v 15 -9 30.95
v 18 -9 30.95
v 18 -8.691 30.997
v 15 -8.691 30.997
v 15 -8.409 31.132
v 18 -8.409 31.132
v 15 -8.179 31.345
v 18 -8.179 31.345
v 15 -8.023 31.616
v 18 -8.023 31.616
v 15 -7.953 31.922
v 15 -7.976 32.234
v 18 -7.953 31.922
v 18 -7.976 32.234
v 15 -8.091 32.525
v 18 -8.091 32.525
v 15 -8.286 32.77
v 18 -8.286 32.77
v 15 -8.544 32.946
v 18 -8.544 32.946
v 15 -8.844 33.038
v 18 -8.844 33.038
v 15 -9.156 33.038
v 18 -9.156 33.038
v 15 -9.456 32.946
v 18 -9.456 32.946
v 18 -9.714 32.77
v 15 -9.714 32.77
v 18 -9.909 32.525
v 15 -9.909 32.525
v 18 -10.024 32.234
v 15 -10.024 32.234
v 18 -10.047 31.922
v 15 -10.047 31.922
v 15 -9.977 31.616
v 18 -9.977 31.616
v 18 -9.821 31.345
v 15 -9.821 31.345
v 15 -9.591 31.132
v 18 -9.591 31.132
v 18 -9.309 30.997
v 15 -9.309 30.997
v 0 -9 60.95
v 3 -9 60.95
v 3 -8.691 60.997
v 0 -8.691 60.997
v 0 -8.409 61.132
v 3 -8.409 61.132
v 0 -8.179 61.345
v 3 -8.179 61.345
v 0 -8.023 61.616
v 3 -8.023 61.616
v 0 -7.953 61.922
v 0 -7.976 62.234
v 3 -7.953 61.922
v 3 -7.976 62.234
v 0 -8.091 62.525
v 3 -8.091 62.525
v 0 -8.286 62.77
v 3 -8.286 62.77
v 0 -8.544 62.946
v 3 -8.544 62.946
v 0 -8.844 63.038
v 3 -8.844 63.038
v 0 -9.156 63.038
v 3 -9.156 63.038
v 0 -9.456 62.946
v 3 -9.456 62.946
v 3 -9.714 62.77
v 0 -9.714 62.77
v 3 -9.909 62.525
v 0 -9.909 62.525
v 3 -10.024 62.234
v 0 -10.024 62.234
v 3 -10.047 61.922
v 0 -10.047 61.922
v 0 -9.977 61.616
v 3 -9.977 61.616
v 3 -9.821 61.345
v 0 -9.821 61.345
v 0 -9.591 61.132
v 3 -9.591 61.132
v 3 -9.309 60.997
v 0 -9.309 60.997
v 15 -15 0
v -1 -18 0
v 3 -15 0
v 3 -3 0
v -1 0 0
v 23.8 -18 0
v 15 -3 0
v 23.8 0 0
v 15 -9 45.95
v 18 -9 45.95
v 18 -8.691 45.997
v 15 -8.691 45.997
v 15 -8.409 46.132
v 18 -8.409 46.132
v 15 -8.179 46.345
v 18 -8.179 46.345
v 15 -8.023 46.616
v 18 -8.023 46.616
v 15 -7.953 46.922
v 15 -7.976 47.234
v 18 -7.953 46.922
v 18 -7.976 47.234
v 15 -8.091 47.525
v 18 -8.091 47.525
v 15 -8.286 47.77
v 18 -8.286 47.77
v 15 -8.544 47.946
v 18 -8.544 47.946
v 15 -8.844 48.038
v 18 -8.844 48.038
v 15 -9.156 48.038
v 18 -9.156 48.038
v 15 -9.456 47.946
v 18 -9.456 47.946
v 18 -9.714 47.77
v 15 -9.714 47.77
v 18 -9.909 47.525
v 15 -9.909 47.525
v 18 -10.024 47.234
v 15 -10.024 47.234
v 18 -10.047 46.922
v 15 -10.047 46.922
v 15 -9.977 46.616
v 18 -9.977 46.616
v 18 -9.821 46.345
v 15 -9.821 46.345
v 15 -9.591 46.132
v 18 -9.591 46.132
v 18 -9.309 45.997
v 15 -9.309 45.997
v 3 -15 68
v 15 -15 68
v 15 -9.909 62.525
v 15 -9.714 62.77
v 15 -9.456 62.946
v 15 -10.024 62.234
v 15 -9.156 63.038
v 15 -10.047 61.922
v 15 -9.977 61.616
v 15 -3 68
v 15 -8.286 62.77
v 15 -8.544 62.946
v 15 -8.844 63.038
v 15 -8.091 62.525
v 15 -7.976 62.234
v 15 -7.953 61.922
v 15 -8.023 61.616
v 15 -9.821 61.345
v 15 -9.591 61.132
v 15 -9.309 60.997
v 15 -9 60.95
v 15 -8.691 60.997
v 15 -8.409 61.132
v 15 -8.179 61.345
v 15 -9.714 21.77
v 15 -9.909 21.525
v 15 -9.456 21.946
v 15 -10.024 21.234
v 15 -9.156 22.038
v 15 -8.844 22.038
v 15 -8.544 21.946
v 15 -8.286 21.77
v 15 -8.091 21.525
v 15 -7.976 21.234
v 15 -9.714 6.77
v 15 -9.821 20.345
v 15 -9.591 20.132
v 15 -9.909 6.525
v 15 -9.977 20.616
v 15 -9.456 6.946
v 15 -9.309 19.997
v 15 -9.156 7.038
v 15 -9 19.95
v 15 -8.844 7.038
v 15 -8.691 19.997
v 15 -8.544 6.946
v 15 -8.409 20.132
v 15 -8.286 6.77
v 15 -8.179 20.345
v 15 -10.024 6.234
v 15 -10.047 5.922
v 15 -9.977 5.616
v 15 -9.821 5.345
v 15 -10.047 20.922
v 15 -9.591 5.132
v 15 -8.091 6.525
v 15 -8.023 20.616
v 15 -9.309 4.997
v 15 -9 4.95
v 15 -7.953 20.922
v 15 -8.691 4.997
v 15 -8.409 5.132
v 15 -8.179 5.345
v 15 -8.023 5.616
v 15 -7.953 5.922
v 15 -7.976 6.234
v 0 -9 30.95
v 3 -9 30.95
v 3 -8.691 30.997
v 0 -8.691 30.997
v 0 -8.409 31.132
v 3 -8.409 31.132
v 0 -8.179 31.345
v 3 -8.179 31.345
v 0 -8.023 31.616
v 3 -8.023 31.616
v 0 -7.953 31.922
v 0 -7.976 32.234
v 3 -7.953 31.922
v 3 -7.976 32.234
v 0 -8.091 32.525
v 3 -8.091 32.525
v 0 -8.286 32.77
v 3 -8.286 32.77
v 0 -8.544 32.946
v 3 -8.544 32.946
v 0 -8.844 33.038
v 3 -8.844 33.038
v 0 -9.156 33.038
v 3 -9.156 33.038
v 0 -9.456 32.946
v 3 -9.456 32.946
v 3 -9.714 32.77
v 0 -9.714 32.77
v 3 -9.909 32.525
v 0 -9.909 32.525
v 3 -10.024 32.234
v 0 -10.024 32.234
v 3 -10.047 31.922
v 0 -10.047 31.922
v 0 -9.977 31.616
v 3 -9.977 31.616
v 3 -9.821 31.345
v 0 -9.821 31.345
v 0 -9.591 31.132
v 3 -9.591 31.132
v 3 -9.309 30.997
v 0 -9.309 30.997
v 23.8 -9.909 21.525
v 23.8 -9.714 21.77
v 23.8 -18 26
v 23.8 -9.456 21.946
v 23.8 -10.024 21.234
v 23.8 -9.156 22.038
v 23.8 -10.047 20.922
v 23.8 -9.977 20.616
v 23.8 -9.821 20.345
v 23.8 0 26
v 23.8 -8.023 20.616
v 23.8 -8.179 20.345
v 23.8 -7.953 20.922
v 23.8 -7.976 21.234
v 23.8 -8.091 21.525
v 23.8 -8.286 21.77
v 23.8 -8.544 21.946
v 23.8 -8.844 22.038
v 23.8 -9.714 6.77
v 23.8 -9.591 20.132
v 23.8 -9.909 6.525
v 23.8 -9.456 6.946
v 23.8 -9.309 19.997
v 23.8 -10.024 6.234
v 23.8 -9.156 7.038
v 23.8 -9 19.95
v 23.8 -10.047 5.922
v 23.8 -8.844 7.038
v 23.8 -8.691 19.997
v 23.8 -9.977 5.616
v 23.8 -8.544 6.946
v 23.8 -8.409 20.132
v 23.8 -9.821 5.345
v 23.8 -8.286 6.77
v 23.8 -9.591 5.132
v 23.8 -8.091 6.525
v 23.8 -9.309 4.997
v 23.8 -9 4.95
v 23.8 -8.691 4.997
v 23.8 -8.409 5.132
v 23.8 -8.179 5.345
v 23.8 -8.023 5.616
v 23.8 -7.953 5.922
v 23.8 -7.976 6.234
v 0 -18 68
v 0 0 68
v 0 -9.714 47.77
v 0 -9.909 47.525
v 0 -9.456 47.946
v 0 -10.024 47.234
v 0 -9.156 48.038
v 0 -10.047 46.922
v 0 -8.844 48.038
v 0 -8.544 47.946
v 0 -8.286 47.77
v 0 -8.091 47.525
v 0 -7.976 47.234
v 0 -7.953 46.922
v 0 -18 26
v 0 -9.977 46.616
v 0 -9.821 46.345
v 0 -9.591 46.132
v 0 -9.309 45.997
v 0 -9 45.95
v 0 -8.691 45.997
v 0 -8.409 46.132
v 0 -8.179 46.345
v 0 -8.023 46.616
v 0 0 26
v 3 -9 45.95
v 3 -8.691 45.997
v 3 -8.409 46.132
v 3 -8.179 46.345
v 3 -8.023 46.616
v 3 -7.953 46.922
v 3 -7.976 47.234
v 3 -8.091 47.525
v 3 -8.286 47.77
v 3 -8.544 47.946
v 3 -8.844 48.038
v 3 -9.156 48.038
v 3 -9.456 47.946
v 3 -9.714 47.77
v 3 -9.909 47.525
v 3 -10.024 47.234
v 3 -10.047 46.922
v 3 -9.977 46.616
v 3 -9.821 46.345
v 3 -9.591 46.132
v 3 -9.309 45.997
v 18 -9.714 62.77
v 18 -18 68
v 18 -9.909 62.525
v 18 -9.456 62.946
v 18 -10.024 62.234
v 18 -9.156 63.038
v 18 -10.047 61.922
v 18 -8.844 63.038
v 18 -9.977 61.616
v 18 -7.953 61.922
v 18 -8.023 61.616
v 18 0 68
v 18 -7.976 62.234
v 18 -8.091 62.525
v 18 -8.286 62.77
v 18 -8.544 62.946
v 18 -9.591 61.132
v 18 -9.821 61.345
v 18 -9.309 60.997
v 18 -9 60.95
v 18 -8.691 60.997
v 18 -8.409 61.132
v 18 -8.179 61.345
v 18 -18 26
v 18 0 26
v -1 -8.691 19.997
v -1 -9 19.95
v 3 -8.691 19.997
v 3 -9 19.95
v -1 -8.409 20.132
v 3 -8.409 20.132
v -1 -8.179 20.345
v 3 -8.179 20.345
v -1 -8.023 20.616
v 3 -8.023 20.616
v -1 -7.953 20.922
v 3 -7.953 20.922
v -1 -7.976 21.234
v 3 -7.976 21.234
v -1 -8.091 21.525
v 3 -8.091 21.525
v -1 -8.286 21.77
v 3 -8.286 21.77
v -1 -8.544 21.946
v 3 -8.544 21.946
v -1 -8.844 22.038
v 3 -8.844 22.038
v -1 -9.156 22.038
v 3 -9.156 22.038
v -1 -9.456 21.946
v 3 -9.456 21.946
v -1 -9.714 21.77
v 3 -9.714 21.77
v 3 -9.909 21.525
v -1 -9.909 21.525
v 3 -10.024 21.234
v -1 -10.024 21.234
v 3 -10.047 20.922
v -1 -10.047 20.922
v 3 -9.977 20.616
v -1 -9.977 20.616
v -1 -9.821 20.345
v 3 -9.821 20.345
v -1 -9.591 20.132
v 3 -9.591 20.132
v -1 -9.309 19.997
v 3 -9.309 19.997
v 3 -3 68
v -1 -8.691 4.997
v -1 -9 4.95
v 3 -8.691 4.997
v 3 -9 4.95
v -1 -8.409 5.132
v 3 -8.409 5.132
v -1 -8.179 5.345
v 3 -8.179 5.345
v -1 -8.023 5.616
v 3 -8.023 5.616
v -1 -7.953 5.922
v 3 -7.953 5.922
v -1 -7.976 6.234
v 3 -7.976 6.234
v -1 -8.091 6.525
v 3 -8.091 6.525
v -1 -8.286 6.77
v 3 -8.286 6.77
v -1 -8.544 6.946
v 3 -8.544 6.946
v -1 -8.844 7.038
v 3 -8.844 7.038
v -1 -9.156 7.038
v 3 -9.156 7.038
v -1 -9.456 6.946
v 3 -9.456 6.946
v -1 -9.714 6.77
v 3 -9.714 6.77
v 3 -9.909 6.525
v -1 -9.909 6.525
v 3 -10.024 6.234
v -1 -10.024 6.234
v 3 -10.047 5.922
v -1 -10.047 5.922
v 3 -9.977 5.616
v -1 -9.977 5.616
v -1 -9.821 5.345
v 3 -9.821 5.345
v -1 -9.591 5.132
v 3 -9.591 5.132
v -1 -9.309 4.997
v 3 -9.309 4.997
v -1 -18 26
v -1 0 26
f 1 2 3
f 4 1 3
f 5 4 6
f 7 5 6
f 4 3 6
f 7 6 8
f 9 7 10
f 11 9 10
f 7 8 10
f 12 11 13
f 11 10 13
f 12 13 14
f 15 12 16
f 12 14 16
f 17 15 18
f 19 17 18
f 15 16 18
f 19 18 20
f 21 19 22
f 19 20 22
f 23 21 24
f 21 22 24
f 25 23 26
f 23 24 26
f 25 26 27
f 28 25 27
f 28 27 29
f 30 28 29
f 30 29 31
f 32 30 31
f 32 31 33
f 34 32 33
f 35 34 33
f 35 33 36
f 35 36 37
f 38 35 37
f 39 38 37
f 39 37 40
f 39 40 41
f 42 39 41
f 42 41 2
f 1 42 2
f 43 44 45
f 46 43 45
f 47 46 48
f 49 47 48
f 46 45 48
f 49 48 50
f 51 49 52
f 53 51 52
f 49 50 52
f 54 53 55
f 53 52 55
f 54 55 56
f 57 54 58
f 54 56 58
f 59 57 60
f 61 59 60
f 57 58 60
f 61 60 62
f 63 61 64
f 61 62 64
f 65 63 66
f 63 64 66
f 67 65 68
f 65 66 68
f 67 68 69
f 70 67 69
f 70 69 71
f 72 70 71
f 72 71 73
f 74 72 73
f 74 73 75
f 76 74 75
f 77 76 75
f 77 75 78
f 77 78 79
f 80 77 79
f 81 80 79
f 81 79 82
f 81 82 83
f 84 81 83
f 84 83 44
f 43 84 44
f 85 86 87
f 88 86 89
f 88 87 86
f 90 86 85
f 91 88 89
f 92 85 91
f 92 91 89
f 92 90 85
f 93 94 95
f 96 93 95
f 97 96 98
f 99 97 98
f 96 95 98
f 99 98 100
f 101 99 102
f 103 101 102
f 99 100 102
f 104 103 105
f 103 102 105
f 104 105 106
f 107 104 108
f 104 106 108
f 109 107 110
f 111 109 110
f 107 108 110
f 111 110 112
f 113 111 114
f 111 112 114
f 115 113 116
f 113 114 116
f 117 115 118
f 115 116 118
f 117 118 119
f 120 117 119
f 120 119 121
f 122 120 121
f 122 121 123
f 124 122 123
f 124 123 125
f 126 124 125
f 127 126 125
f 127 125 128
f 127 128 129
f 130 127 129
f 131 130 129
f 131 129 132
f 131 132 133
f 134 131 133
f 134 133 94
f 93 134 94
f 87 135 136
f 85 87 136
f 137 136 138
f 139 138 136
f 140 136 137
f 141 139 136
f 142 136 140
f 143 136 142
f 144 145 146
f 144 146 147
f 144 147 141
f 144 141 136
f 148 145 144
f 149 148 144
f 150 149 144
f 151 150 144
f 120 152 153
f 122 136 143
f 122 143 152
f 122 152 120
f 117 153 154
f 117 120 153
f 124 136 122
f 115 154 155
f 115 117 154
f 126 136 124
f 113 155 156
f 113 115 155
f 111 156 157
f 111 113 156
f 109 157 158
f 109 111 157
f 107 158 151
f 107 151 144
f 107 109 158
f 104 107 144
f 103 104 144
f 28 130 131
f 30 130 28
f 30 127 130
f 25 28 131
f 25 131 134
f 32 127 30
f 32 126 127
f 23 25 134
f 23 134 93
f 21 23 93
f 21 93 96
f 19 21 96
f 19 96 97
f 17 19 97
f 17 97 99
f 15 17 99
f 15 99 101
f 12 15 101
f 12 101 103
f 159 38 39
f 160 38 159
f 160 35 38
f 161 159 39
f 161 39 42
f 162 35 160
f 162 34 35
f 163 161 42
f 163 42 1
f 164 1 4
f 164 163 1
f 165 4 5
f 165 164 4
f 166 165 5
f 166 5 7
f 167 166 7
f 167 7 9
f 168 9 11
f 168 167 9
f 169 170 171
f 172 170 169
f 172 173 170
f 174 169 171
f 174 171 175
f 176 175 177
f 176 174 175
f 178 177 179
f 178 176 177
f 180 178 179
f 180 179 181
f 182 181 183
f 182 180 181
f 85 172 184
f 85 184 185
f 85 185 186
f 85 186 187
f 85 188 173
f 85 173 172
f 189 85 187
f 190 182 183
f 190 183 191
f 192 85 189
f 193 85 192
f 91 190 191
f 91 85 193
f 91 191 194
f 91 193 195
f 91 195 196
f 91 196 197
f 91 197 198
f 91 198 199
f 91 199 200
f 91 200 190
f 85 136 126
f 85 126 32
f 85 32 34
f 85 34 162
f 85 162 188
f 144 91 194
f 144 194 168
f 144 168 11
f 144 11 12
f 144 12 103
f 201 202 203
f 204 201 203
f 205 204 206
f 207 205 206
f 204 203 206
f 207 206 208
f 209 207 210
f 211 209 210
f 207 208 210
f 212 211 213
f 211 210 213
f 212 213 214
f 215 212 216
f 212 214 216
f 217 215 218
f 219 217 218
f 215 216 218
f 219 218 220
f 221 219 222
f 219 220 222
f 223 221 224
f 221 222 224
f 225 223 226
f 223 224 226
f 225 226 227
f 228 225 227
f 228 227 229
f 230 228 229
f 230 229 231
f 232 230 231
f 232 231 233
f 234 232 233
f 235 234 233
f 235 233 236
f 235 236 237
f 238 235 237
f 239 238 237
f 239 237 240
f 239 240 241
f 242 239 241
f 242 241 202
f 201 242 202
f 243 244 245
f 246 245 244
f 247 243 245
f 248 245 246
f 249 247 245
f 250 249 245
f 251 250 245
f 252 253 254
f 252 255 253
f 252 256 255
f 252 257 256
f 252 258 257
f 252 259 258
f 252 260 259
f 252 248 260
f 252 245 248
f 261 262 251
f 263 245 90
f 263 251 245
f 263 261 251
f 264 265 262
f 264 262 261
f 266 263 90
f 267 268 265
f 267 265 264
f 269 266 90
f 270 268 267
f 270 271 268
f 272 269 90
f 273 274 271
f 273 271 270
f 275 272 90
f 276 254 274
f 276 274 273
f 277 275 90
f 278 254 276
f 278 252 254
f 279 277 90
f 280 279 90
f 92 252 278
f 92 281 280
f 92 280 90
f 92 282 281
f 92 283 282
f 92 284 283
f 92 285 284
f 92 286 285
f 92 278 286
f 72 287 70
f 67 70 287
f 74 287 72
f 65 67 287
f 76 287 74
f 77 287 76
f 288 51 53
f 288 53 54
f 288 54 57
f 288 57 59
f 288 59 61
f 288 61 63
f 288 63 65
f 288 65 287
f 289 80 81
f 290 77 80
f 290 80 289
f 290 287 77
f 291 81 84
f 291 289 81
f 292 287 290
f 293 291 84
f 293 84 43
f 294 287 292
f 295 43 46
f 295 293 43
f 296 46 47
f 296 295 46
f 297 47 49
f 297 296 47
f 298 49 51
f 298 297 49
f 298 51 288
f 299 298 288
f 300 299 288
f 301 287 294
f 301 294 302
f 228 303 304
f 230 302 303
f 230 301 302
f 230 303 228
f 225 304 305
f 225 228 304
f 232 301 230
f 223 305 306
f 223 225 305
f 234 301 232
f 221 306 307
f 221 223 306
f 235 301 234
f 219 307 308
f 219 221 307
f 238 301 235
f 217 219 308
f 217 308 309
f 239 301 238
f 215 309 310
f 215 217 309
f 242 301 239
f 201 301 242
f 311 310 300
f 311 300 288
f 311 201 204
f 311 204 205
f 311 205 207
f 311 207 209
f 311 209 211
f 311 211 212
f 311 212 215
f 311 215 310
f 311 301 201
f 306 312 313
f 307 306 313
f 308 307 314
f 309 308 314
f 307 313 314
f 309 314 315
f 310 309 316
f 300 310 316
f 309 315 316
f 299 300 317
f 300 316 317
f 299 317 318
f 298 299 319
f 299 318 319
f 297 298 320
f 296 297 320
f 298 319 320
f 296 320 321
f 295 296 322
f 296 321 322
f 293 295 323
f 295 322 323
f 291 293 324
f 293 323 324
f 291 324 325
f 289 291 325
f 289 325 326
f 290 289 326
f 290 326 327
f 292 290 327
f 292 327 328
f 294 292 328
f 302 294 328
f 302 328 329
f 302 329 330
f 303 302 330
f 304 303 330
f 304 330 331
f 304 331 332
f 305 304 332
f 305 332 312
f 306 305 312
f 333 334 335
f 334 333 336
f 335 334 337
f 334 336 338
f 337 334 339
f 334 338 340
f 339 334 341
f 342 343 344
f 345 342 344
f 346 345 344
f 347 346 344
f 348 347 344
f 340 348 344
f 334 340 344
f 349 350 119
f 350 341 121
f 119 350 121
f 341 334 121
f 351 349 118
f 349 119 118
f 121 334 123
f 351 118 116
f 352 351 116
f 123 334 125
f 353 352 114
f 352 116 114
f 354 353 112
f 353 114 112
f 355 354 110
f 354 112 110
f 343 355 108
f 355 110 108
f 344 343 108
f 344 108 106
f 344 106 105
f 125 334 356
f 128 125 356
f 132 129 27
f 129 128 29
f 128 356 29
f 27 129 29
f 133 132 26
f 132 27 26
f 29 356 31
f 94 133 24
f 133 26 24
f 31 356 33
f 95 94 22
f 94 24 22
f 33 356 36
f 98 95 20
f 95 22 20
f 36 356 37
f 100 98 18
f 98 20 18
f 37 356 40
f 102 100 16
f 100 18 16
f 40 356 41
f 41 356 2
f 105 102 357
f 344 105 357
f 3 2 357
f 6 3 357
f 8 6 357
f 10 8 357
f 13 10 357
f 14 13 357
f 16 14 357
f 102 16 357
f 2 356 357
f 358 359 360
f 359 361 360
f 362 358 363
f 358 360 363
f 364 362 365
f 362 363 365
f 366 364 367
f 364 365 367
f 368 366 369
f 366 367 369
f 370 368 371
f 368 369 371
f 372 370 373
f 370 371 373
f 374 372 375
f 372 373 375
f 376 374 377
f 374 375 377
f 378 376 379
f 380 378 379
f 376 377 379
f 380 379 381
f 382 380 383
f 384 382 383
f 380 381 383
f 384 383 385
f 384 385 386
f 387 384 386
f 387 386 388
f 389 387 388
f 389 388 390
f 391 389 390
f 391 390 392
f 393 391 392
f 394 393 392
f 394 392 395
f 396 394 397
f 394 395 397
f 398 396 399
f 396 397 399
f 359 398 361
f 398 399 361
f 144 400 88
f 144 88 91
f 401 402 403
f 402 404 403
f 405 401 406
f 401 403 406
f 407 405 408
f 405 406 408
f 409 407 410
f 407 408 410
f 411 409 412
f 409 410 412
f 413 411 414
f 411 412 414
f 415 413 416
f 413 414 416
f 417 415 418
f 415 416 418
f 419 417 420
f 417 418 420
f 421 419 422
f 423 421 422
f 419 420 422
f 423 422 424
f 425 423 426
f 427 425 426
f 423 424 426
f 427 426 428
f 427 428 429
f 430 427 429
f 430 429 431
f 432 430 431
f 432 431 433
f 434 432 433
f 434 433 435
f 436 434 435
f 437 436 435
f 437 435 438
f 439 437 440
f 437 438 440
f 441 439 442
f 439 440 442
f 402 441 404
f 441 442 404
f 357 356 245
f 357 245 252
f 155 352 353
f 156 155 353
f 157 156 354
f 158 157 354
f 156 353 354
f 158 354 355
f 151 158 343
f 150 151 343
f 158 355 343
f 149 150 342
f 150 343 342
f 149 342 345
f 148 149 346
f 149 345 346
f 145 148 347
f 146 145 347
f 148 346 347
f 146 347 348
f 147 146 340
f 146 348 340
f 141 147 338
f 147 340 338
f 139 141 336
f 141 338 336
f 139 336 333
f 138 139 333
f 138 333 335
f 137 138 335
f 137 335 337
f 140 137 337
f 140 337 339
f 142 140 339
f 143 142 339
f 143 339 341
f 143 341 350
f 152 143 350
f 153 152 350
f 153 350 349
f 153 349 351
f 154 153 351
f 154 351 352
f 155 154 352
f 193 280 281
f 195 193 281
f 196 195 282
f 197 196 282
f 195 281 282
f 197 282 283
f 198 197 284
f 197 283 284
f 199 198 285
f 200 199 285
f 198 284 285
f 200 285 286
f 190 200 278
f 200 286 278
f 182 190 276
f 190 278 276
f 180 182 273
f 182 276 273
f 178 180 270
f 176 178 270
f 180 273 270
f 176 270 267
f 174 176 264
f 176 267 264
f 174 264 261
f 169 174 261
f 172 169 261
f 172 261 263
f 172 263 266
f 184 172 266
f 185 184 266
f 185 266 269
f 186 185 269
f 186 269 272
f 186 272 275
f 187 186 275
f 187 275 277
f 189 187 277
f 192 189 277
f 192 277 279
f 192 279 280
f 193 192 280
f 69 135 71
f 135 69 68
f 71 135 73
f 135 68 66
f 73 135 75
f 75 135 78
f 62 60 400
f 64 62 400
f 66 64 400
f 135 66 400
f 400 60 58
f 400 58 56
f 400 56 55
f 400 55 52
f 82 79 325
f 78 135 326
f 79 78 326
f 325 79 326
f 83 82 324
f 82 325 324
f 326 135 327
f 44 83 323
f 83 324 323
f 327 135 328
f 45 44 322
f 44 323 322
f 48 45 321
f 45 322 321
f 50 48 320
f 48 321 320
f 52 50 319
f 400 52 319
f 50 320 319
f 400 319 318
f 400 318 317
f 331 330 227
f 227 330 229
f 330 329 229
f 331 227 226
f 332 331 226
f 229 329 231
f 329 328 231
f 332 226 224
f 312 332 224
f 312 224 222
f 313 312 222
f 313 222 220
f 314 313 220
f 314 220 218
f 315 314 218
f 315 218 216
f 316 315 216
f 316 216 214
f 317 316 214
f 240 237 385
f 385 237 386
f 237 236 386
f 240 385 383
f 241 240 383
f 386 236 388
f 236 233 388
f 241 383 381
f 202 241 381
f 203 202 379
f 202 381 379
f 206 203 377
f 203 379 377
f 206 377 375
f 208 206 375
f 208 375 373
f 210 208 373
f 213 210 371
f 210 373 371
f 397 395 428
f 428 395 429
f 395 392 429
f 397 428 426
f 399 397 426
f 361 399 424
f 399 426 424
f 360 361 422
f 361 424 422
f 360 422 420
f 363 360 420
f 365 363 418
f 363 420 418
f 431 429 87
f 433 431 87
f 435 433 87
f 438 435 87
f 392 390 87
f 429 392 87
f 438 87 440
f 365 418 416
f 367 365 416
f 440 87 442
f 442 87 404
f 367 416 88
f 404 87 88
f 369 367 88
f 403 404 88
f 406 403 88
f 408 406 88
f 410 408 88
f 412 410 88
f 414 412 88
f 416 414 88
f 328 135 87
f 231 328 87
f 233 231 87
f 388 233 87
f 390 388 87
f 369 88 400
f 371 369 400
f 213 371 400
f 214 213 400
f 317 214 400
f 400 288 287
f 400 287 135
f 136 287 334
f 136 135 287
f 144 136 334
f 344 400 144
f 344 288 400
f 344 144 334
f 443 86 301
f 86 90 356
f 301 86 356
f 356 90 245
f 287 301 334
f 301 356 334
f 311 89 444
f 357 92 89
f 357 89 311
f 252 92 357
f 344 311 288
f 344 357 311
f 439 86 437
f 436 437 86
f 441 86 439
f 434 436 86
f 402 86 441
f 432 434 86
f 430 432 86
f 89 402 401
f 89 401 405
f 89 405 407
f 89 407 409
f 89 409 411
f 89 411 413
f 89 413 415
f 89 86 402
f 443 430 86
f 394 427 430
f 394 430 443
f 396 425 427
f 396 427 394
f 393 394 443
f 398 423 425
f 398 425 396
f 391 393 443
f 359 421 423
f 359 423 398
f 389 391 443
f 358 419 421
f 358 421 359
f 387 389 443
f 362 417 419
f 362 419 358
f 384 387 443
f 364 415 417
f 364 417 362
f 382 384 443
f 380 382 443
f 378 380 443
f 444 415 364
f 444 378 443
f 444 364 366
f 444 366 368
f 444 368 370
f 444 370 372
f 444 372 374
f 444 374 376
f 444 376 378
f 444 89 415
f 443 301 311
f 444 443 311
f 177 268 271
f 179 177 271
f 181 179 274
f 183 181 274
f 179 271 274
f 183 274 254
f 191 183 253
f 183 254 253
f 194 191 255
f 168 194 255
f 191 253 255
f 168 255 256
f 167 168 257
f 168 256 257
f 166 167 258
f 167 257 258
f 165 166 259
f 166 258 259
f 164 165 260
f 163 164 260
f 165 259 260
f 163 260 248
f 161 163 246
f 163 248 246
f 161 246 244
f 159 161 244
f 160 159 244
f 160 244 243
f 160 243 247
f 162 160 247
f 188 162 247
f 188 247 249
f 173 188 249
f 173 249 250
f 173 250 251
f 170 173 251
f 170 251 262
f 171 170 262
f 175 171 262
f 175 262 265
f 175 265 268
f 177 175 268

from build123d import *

# Parameters (mm, degrees)
SKETCH_1_W          = 18
SKETCH_1_H          = 18
SKETCH_1_W_2        = 12
SKETCH_1_H_2        = 12
EXTRUDE_1_DEPTH     = 68
SKETCH_2_R          = 1.05
CUT_EXTRUDE_1_DEPTH = 32
SKETCH_3_W          = 26
SKETCH_3_H          = 18
EXTRUDE_2_DEPTH     = 5.8
SKETCH_4_W          = 26
SKETCH_4_H          = 18
EXTRUDE_3_DEPTH     = 1
SKETCH_5_R          = 1.05
CUT_EXTRUDE_2_DEPTH = 41


with BuildPart() as part:
    # 草图1 → 凸台-拉伸1 (new body)
    with BuildSketch(Plane.XY):
        with Locations((9, -9)):
            Rectangle(SKETCH_1_W, SKETCH_1_H)
        with Locations((9, -9)):
            Rectangle(SKETCH_1_W_2, SKETCH_1_H_2, mode=Mode.SUBTRACT)
    extrude(amount=EXTRUDE_1_DEPTH)

    # 草图2 → 切除-拉伸1 (cut)
    with BuildSketch(Plane(origin=(18, 0, 0), x_dir=(0, 0, -1), z_dir=(1, 0, 0))):
        with Locations((-62, -9)):
            Circle(SKETCH_2_R)
        with Locations((-47, -9)):
            Circle(SKETCH_2_R)
        with Locations((-32, -9)):
            Circle(SKETCH_2_R)
        with Locations((-6, -9)):
            Circle(SKETCH_2_R)
        with Locations((-21, -9)):
            Circle(SKETCH_2_R)
    extrude(amount=-CUT_EXTRUDE_1_DEPTH, mode=Mode.SUBTRACT)

    # 草图3 → 凸台-拉伸2 (add)
    with BuildSketch(Plane(origin=(18, 0, 0), x_dir=(0, 0, -1), z_dir=(1, 0, 0))):
        with Locations((-13, -9)):
            Rectangle(SKETCH_3_W, SKETCH_3_H)
    extrude(amount=EXTRUDE_2_DEPTH)

    # 草图4 → 凸台-拉伸3 (add)
    with BuildSketch(Plane.ZY):
        with Locations((13, -9)):
            Rectangle(SKETCH_4_W, SKETCH_4_H)
    extrude(amount=EXTRUDE_3_DEPTH)

    # 草图5 → 切除-拉伸2 (cut)
    with BuildSketch(Plane(origin=(23.8, 0, 0), x_dir=(0, 0, -1), z_dir=(1, 0, 0))):
        with Locations((-6, -9)):
            Circle(SKETCH_5_R)
        with Locations((-21, -9)):
            Circle(SKETCH_5_R)
    extrude(amount=-CUT_EXTRUDE_2_DEPTH, mode=Mode.SUBTRACT)


solid = part.part
